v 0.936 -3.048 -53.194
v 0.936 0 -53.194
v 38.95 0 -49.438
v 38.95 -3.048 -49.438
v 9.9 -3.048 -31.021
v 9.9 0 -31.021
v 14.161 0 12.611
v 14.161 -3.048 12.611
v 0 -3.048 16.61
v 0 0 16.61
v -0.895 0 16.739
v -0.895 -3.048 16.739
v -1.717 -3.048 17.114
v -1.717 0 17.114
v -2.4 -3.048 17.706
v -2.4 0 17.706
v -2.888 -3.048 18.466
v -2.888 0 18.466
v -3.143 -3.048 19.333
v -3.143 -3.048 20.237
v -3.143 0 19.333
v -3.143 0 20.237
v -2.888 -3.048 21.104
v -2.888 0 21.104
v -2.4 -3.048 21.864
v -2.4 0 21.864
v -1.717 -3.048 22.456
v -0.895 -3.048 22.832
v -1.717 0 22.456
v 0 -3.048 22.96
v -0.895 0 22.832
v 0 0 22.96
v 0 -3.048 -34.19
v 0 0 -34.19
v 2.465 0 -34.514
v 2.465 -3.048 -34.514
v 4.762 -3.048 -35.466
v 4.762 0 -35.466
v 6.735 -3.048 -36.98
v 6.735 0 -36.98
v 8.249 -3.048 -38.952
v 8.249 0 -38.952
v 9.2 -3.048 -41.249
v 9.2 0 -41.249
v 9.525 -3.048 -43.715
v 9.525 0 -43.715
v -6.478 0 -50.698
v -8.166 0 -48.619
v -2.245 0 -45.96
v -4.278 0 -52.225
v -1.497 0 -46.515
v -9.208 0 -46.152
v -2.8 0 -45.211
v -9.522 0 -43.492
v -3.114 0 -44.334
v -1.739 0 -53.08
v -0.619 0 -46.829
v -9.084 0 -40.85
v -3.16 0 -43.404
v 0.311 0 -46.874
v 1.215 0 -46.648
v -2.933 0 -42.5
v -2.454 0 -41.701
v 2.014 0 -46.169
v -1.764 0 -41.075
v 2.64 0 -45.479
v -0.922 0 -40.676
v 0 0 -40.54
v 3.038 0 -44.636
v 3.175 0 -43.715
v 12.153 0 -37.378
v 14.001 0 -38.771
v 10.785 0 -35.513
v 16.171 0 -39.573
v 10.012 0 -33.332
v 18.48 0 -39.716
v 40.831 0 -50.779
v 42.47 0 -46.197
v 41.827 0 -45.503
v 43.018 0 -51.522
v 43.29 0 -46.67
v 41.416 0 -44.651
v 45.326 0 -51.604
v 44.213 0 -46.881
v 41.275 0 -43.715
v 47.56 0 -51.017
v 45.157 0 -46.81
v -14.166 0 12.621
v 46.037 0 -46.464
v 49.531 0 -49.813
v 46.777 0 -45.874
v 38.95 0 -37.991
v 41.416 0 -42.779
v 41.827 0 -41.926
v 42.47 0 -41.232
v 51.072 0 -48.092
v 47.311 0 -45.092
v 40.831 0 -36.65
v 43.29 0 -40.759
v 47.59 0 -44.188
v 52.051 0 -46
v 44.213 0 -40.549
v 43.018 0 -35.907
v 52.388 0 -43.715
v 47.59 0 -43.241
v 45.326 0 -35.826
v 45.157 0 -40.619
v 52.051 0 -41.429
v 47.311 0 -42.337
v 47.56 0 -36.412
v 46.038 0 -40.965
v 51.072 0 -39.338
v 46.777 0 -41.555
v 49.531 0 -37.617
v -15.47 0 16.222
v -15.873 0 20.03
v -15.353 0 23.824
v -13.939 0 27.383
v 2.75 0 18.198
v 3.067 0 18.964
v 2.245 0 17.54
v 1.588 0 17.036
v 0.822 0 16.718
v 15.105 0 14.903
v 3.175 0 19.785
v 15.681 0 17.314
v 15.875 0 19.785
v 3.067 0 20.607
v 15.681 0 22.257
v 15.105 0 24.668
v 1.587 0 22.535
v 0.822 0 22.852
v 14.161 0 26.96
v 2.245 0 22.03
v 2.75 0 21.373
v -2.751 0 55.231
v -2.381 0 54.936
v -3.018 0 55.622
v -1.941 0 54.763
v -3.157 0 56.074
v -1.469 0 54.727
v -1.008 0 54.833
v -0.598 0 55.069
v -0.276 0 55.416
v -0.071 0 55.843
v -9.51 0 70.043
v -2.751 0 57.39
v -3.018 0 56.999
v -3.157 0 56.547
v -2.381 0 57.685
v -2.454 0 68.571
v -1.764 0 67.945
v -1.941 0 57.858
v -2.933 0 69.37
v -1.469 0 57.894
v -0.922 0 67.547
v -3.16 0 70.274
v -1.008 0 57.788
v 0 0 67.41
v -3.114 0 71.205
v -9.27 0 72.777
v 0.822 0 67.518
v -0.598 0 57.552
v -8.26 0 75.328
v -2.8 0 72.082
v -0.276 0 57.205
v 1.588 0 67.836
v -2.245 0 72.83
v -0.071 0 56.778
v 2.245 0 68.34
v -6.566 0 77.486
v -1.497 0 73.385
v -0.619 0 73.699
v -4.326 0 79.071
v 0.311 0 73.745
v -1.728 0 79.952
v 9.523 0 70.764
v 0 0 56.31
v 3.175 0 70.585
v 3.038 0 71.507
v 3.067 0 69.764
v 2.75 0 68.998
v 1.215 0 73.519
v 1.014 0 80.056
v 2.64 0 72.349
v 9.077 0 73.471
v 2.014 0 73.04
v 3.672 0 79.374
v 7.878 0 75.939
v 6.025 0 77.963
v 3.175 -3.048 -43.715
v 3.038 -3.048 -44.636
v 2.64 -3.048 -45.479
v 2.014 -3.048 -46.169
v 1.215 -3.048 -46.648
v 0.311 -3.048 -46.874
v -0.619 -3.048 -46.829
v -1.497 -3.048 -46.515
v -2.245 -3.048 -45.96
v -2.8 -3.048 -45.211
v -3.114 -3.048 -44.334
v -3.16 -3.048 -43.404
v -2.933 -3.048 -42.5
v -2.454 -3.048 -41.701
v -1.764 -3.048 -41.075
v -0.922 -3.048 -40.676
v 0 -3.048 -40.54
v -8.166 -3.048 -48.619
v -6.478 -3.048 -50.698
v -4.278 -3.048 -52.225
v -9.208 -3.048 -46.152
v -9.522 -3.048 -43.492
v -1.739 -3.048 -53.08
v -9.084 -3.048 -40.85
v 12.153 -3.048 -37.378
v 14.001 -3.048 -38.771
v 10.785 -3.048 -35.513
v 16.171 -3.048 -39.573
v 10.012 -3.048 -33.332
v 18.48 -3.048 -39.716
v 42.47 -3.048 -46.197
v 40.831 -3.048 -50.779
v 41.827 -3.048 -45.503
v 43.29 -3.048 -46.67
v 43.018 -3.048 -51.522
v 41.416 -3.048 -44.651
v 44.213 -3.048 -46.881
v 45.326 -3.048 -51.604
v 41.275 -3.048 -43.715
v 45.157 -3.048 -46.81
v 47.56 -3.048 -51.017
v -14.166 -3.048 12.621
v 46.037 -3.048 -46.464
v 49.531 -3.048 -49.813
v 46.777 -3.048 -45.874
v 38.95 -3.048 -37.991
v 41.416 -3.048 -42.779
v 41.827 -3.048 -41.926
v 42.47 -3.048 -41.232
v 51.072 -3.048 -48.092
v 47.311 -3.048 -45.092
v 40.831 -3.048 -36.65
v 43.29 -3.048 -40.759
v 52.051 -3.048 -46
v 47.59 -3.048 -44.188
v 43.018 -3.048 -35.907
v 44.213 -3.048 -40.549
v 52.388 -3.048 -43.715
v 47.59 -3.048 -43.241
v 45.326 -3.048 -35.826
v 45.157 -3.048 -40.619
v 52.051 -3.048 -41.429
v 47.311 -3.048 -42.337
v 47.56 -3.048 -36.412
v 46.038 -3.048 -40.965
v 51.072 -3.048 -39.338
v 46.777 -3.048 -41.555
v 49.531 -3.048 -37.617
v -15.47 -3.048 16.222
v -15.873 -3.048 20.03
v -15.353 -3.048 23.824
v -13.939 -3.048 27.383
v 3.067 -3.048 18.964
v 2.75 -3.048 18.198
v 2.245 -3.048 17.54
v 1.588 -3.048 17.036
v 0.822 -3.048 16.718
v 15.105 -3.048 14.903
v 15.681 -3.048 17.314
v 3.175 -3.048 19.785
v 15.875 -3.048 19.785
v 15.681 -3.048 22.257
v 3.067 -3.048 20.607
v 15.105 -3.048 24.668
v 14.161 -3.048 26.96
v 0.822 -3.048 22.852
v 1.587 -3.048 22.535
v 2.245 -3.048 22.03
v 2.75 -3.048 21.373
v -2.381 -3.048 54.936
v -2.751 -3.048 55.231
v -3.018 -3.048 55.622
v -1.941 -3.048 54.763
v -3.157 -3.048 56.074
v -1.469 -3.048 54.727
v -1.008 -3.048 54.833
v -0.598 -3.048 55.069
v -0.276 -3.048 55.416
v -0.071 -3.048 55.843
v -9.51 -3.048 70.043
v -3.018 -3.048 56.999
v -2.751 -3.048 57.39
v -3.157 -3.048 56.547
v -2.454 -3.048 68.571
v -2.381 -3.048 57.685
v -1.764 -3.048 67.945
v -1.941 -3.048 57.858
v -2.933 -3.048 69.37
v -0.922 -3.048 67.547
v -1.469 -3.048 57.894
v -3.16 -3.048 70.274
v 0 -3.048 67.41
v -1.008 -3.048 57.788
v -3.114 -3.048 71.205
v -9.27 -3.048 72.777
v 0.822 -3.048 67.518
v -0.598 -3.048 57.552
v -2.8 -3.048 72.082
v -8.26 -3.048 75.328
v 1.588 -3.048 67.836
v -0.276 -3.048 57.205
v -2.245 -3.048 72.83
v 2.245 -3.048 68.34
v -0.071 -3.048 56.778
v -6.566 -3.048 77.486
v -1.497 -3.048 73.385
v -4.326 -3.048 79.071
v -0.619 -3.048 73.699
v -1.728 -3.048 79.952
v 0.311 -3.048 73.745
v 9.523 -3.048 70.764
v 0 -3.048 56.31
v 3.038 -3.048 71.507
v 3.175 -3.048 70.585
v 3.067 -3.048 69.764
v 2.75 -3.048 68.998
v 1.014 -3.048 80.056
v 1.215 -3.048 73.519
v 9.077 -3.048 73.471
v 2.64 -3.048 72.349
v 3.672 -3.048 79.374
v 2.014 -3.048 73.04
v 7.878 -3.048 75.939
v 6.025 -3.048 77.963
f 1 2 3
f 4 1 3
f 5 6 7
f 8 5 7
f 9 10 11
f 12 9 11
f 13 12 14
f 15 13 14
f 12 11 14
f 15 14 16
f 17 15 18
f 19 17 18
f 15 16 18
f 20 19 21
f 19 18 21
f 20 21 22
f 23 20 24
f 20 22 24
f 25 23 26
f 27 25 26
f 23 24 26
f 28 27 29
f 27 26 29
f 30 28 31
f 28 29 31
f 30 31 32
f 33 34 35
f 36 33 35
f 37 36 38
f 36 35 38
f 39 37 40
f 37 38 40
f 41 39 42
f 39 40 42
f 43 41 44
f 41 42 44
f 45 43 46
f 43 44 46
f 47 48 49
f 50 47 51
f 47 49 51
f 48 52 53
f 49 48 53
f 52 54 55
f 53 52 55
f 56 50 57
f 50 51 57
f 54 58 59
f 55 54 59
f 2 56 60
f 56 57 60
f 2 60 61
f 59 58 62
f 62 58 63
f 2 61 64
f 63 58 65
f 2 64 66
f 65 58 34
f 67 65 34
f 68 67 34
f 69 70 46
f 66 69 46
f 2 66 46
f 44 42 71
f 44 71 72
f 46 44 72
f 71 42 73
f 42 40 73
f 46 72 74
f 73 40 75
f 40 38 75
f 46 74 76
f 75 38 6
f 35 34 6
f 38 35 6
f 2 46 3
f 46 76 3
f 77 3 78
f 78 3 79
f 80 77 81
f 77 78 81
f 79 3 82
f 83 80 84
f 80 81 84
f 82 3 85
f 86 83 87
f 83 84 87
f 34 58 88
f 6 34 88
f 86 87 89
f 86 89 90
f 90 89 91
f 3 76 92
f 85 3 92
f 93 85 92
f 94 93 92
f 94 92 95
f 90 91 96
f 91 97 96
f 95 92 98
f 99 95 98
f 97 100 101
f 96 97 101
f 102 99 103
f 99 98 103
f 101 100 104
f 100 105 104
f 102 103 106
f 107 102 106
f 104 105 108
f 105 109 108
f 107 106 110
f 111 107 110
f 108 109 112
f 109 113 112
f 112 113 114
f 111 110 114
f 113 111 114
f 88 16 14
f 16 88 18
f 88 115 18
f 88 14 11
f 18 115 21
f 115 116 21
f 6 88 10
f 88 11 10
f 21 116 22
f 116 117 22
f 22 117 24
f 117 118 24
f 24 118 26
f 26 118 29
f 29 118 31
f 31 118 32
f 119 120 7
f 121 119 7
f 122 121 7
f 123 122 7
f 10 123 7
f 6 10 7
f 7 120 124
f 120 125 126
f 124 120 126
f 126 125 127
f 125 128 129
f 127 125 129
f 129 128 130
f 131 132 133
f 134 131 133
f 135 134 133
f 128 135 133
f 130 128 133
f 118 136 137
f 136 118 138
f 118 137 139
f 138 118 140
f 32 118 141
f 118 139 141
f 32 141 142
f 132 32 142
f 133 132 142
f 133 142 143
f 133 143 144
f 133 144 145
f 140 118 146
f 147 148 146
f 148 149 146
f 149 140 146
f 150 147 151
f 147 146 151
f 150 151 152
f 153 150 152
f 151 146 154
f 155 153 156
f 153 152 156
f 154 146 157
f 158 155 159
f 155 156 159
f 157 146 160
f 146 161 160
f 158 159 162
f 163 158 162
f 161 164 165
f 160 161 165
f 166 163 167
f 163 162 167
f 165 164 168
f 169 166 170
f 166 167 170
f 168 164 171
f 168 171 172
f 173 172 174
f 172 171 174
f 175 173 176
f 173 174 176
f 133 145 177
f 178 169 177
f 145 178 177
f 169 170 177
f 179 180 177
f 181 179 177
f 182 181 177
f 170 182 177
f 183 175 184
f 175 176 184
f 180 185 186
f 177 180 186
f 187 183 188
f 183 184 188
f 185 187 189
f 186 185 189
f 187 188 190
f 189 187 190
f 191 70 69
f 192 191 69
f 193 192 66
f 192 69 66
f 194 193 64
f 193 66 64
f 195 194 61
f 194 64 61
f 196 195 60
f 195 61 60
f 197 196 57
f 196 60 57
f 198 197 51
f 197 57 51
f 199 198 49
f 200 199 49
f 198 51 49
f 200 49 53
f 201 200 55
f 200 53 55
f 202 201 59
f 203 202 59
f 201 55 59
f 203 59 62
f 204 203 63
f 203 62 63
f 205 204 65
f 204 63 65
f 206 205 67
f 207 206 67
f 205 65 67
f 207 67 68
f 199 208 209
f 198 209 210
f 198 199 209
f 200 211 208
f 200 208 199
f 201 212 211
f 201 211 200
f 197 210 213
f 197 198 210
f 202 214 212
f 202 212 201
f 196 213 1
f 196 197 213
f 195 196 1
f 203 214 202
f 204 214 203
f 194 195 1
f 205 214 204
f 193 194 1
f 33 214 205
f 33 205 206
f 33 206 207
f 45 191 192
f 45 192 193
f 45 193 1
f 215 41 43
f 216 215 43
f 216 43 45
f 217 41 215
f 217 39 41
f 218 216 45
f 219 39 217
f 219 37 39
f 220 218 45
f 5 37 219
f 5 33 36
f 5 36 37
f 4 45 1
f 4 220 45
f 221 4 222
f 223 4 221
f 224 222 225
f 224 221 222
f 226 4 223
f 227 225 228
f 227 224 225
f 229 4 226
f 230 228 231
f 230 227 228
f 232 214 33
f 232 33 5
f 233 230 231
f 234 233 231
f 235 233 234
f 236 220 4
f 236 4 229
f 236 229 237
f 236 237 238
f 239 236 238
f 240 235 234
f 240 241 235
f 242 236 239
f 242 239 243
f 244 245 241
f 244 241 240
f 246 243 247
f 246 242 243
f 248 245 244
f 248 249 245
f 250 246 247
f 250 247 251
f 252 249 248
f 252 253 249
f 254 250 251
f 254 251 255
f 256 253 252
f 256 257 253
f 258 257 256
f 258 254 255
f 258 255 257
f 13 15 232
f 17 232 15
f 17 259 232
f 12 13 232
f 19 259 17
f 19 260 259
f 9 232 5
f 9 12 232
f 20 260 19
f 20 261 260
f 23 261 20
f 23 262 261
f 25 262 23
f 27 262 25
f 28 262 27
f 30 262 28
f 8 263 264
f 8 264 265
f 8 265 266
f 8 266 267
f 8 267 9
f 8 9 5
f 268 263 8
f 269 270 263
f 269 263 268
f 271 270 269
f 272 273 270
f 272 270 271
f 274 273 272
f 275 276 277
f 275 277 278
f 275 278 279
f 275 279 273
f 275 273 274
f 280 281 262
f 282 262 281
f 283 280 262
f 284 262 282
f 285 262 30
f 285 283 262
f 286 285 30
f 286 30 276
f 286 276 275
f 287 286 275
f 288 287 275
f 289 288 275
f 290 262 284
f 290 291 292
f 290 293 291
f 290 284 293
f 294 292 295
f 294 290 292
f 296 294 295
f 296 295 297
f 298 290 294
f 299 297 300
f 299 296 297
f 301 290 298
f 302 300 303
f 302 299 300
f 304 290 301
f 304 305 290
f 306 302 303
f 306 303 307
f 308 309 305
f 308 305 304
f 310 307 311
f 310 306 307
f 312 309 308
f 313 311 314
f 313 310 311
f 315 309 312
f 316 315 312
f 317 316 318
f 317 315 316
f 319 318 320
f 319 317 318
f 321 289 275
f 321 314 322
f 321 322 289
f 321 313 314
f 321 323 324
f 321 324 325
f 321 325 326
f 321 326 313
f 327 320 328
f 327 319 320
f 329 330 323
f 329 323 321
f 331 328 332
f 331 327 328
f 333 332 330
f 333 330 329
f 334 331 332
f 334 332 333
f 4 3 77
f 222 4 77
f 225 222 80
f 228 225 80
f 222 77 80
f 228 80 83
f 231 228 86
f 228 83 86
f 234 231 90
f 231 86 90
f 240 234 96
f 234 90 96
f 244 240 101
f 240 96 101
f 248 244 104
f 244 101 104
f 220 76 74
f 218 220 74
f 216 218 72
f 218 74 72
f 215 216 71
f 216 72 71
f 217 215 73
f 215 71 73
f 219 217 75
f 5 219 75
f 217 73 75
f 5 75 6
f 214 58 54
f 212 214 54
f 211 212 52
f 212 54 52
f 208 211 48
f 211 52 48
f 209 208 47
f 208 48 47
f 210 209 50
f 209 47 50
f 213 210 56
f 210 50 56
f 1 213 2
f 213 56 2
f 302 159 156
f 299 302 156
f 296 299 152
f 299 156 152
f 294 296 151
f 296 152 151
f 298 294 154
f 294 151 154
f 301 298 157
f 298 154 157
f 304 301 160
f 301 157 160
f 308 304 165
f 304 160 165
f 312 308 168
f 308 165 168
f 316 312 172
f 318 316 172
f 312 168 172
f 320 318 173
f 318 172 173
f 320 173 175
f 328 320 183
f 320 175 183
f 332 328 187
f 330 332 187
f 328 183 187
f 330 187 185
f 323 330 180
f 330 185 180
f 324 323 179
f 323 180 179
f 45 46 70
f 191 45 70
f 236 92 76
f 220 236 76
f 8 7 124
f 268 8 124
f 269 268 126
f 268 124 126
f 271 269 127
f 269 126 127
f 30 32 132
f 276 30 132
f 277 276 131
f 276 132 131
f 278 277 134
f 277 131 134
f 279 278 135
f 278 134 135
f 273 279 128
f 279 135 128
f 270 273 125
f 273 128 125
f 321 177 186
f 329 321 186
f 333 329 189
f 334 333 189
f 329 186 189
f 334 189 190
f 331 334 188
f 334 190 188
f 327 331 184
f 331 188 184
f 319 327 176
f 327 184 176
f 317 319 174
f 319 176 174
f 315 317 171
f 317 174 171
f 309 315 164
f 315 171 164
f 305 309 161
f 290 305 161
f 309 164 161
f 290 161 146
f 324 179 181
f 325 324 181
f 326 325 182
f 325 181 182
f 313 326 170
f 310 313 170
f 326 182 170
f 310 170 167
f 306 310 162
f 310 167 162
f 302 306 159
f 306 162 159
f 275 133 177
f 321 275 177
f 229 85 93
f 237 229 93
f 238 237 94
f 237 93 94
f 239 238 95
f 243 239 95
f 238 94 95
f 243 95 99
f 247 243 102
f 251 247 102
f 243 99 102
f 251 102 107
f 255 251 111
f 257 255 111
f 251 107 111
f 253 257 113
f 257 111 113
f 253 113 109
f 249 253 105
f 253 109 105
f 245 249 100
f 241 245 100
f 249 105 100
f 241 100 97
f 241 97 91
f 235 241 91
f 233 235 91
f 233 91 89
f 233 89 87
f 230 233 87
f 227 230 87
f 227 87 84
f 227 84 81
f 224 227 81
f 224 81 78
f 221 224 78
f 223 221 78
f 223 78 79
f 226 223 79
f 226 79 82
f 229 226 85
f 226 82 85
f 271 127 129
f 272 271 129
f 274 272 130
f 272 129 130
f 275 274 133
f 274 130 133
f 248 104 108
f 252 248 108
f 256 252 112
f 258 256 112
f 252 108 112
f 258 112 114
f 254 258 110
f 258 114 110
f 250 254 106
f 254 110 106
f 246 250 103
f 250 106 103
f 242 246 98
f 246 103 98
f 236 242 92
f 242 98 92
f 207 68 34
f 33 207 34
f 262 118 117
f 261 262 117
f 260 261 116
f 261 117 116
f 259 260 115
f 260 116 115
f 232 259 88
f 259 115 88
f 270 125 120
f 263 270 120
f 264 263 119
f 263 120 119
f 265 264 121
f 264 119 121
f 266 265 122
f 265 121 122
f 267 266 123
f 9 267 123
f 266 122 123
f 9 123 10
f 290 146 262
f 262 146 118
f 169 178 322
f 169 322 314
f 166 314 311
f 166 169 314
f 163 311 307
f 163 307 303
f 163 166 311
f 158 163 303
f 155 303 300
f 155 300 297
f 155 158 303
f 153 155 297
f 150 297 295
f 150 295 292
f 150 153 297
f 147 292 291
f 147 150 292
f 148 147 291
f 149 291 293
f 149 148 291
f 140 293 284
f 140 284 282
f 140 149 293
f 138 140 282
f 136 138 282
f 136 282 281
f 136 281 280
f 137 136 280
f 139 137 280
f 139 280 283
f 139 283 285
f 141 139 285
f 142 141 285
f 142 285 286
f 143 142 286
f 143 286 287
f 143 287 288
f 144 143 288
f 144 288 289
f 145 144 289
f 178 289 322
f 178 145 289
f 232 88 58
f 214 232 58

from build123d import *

# Parameters (mm, degrees)
F0_R     = 1.5875
F1_DEPTH = 3.048


with BuildPart() as f1:
    # F0 (on Front) → F1 (new body)
    with BuildSketch(Plane.XZ):
        with BuildLine():
            ThreePointArc((-9.5095663313, 70.0432862662), (-6.5407566171, 63.6611249112), (0, 61.0602947442))
            ThreePointArc((0, 61.0602947442), (6.7351920908, 63.8501026534), (9.525, 70.5852947442))
            ThreePointArc((9.525, 70.5852947442), (9.5245806872, 70.6746688591), (9.5233227858, 70.7640351052))
            ThreePointArc((9.5233227858, 70.7640351052), (-0.3604400536, 80.1034725093), (-9.5095663313, 70.0432862662))
        make_face()
        with BuildLine():
            ThreePointArc((3.175, 70.5852947442), (2.2450640303, 68.3402307139), (0, 67.4102947442))
            ThreePointArc((0, 67.4102947442), (-2.2450640303, 72.8303587744), (3.175, 70.5852947442))
        make_face(mode=Mode.SUBTRACT)
        with BuildLine():
            ThreePointArc((9.525, 70.5852947442), (6.7351920908, 63.8501026534), (0, 61.0602947442))
            Line((0, 61.0602947442), (0, 56.3104947442))
            Line((0, 56.3104947442), (0, 35.6602947442))
            ThreePointArc((0, 35.6602947442), (8.3101303729, 33.311467824), (14.1611668333, 26.9600406573))
            Line((14.1611668333, 26.9600406573), (9.5233227858, 70.7640351052))
            ThreePointArc((9.5233227858, 70.7640351052), (9.5245806872, 70.6746688591), (9.525, 70.5852947442))
        make_face()
        with BuildLine():
            Line((0, 56.3104947442), (0, 61.0602947442))
            ThreePointArc((0, 61.0602947442), (-6.5407566171, 63.6611249112), (-9.5095663313, 70.0432862662))
            Line((-9.5095663313, 70.0432862662), (-13.9389716008, 27.3827084956))
            ThreePointArc((-13.9389716008, 27.3827084956), (-8.1057597329, 33.4349205322), (0, 35.6602947442))
            Line((0, 35.6602947442), (0, 56.3104947442))
        make_face()
        with Locations((-1.5875, 56.3104947442)):
            Circle(F0_R, mode=Mode.SUBTRACT)
        with BuildLine():
            ThreePointArc((14.1611668333, 26.9600406573), (8.3101303729, 33.311467824), (0, 35.6602947442))
            Line((0, 35.6602947442), (0, 22.9602947442))
            ThreePointArc((0, 22.9602947442), (2.2450640303, 22.0303587744), (3.175, 19.7852947442))
            ThreePointArc((3.175, 19.7852947442), (2.2450640303, 17.5402307139), (0, 16.6102947442))
            Line((0, 16.6102947442), (0, 3.9102947442))
            ThreePointArc((0, 3.9102947442), (8.3101303729, 6.2591216643), (14.1611668333, 12.610548831))
            ThreePointArc((14.1611668333, 12.610548831), (15.4405982475, 16.0969955751), (15.875, 19.7852947442))
            ThreePointArc((15.875, 19.7852947442), (15.4405982475, 23.4735939132), (14.1611668333, 26.9600406573))
        make_face()
        with BuildLine():
            Line((0, 22.9602947442), (0, 35.6602947442))
            ThreePointArc((0, 35.6602947442), (-8.1057597329, 33.4349205322), (-13.9389716008, 27.3827084956))
            ThreePointArc((-13.9389716008, 27.3827084956), (-15.8731151109, 20.0299203253), (-14.166468593, 12.621022792))
            ThreePointArc((-14.166468593, 12.621022792), (-8.31513102, 6.262195206), (0, 3.9102947442))
            Line((0, 3.9102947442), (0, 16.6102947442))
            ThreePointArc((0, 16.6102947442), (-3.175, 19.7852947442), (0, 22.9602947442))
        make_face()
        with BuildLine():
            ThreePointArc((0, 3.9102947442), (-8.31513102, 6.262195206), (-14.166468593, 12.621022792))
            Line((-14.166468593, 12.621022792), (-9.0839344232, -40.84978634))
            ThreePointArc((-9.0839344232, -40.84978634), (-5.6319300567, -36.0331045869), (0, -34.1897052558))
            Line((0, -34.1897052558), (0, 0))
            Line((0, 0), (0, 3.9102947442))
        make_face()
        with BuildLine():
            ThreePointArc((14.1611668333, 12.610548831), (8.3101303729, 6.2591216643), (0, 3.9102947442))
            Line((0, 3.9102947442), (0, 0))
            Line((0, 0), (0, -34.1897052558))
            ThreePointArc((0, -34.1897052558), (6.7351920908, -36.979513165), (9.525, -43.7147052558))
            Line((9.525, -43.7147052558), (36.5125, -43.7147052558))
            ThreePointArc((36.5125, -43.7147052558), (37.1472997839, -40.6043233172), (38.9501631947, -37.9914455758))
            Line((38.9501631947, -37.9914455758), (18.4799116013, -39.7163473726))
            ThreePointArc((18.4799116013, -39.7163473726), (12.1534860854, -37.3783781365), (9.8998108989, -31.0214364103))
            Line((9.8998108989, -31.0214364103), (14.1611668333, 12.610548831))
        make_face()
        with BuildLine():
            ThreePointArc((0, -34.1897052558), (-5.6319300567, -36.0331045869), (-9.0839344232, -40.84978634))
            ThreePointArc((-9.0839344232, -40.84978634), (-7.3950973803, -49.7178843915), (0.9364707331, -53.1935579061))
            ThreePointArc((0.9364707331, -53.1935579061), (7.058523526, -50.1102404667), (9.525, -43.7147052558))
            Line((9.525, -43.7147052558), (3.175, -43.7147052558))
            ThreePointArc((3.175, -43.7147052558), (-2.2450640303, -45.9597692861), (0, -40.5397052558))
            Line((0, -40.5397052558), (0, -34.1897052558))
        make_face()
        with BuildLine():
            ThreePointArc((9.525, -43.7147052558), (7.058523526, -50.1102404667), (0.9364707331, -53.1935579061))
            Line((0.9364707331, -53.1935579061), (38.9501631947, -49.4379649358))
            ThreePointArc((38.9501631947, -49.4379649358), (37.1472997839, -46.8250871944), (36.5125, -43.7147052558))
            Line((36.5125, -43.7147052558), (9.525, -43.7147052558))
        make_face()
        with BuildLine():
            ThreePointArc((36.5125, -43.7147052558), (37.1472997839, -46.8250871944), (38.9501631947, -49.4379649358))
            ThreePointArc((38.9501631947, -49.4379649358), (47.5603819386, -51.0174054719), (52.3875, -43.7147052558))
            ThreePointArc((52.3875, -43.7147052558), (47.5603819386, -36.4120050397), (38.9501631947, -37.9914455758))
            ThreePointArc((38.9501631947, -37.9914455758), (37.1472997839, -40.6043233172), (36.5125, -43.7147052558))
        make_face()
        with BuildLine():
            ThreePointArc((47.625, -43.7147052558), (44.45, -46.8897052558), (41.275, -43.7147052558))
            ThreePointArc((41.275, -43.7147052558), (44.45, -40.5397052558), (47.625, -43.7147052558))
        make_face(mode=Mode.SUBTRACT)
    extrude(amount=F1_DEPTH)


solid = f1.part
